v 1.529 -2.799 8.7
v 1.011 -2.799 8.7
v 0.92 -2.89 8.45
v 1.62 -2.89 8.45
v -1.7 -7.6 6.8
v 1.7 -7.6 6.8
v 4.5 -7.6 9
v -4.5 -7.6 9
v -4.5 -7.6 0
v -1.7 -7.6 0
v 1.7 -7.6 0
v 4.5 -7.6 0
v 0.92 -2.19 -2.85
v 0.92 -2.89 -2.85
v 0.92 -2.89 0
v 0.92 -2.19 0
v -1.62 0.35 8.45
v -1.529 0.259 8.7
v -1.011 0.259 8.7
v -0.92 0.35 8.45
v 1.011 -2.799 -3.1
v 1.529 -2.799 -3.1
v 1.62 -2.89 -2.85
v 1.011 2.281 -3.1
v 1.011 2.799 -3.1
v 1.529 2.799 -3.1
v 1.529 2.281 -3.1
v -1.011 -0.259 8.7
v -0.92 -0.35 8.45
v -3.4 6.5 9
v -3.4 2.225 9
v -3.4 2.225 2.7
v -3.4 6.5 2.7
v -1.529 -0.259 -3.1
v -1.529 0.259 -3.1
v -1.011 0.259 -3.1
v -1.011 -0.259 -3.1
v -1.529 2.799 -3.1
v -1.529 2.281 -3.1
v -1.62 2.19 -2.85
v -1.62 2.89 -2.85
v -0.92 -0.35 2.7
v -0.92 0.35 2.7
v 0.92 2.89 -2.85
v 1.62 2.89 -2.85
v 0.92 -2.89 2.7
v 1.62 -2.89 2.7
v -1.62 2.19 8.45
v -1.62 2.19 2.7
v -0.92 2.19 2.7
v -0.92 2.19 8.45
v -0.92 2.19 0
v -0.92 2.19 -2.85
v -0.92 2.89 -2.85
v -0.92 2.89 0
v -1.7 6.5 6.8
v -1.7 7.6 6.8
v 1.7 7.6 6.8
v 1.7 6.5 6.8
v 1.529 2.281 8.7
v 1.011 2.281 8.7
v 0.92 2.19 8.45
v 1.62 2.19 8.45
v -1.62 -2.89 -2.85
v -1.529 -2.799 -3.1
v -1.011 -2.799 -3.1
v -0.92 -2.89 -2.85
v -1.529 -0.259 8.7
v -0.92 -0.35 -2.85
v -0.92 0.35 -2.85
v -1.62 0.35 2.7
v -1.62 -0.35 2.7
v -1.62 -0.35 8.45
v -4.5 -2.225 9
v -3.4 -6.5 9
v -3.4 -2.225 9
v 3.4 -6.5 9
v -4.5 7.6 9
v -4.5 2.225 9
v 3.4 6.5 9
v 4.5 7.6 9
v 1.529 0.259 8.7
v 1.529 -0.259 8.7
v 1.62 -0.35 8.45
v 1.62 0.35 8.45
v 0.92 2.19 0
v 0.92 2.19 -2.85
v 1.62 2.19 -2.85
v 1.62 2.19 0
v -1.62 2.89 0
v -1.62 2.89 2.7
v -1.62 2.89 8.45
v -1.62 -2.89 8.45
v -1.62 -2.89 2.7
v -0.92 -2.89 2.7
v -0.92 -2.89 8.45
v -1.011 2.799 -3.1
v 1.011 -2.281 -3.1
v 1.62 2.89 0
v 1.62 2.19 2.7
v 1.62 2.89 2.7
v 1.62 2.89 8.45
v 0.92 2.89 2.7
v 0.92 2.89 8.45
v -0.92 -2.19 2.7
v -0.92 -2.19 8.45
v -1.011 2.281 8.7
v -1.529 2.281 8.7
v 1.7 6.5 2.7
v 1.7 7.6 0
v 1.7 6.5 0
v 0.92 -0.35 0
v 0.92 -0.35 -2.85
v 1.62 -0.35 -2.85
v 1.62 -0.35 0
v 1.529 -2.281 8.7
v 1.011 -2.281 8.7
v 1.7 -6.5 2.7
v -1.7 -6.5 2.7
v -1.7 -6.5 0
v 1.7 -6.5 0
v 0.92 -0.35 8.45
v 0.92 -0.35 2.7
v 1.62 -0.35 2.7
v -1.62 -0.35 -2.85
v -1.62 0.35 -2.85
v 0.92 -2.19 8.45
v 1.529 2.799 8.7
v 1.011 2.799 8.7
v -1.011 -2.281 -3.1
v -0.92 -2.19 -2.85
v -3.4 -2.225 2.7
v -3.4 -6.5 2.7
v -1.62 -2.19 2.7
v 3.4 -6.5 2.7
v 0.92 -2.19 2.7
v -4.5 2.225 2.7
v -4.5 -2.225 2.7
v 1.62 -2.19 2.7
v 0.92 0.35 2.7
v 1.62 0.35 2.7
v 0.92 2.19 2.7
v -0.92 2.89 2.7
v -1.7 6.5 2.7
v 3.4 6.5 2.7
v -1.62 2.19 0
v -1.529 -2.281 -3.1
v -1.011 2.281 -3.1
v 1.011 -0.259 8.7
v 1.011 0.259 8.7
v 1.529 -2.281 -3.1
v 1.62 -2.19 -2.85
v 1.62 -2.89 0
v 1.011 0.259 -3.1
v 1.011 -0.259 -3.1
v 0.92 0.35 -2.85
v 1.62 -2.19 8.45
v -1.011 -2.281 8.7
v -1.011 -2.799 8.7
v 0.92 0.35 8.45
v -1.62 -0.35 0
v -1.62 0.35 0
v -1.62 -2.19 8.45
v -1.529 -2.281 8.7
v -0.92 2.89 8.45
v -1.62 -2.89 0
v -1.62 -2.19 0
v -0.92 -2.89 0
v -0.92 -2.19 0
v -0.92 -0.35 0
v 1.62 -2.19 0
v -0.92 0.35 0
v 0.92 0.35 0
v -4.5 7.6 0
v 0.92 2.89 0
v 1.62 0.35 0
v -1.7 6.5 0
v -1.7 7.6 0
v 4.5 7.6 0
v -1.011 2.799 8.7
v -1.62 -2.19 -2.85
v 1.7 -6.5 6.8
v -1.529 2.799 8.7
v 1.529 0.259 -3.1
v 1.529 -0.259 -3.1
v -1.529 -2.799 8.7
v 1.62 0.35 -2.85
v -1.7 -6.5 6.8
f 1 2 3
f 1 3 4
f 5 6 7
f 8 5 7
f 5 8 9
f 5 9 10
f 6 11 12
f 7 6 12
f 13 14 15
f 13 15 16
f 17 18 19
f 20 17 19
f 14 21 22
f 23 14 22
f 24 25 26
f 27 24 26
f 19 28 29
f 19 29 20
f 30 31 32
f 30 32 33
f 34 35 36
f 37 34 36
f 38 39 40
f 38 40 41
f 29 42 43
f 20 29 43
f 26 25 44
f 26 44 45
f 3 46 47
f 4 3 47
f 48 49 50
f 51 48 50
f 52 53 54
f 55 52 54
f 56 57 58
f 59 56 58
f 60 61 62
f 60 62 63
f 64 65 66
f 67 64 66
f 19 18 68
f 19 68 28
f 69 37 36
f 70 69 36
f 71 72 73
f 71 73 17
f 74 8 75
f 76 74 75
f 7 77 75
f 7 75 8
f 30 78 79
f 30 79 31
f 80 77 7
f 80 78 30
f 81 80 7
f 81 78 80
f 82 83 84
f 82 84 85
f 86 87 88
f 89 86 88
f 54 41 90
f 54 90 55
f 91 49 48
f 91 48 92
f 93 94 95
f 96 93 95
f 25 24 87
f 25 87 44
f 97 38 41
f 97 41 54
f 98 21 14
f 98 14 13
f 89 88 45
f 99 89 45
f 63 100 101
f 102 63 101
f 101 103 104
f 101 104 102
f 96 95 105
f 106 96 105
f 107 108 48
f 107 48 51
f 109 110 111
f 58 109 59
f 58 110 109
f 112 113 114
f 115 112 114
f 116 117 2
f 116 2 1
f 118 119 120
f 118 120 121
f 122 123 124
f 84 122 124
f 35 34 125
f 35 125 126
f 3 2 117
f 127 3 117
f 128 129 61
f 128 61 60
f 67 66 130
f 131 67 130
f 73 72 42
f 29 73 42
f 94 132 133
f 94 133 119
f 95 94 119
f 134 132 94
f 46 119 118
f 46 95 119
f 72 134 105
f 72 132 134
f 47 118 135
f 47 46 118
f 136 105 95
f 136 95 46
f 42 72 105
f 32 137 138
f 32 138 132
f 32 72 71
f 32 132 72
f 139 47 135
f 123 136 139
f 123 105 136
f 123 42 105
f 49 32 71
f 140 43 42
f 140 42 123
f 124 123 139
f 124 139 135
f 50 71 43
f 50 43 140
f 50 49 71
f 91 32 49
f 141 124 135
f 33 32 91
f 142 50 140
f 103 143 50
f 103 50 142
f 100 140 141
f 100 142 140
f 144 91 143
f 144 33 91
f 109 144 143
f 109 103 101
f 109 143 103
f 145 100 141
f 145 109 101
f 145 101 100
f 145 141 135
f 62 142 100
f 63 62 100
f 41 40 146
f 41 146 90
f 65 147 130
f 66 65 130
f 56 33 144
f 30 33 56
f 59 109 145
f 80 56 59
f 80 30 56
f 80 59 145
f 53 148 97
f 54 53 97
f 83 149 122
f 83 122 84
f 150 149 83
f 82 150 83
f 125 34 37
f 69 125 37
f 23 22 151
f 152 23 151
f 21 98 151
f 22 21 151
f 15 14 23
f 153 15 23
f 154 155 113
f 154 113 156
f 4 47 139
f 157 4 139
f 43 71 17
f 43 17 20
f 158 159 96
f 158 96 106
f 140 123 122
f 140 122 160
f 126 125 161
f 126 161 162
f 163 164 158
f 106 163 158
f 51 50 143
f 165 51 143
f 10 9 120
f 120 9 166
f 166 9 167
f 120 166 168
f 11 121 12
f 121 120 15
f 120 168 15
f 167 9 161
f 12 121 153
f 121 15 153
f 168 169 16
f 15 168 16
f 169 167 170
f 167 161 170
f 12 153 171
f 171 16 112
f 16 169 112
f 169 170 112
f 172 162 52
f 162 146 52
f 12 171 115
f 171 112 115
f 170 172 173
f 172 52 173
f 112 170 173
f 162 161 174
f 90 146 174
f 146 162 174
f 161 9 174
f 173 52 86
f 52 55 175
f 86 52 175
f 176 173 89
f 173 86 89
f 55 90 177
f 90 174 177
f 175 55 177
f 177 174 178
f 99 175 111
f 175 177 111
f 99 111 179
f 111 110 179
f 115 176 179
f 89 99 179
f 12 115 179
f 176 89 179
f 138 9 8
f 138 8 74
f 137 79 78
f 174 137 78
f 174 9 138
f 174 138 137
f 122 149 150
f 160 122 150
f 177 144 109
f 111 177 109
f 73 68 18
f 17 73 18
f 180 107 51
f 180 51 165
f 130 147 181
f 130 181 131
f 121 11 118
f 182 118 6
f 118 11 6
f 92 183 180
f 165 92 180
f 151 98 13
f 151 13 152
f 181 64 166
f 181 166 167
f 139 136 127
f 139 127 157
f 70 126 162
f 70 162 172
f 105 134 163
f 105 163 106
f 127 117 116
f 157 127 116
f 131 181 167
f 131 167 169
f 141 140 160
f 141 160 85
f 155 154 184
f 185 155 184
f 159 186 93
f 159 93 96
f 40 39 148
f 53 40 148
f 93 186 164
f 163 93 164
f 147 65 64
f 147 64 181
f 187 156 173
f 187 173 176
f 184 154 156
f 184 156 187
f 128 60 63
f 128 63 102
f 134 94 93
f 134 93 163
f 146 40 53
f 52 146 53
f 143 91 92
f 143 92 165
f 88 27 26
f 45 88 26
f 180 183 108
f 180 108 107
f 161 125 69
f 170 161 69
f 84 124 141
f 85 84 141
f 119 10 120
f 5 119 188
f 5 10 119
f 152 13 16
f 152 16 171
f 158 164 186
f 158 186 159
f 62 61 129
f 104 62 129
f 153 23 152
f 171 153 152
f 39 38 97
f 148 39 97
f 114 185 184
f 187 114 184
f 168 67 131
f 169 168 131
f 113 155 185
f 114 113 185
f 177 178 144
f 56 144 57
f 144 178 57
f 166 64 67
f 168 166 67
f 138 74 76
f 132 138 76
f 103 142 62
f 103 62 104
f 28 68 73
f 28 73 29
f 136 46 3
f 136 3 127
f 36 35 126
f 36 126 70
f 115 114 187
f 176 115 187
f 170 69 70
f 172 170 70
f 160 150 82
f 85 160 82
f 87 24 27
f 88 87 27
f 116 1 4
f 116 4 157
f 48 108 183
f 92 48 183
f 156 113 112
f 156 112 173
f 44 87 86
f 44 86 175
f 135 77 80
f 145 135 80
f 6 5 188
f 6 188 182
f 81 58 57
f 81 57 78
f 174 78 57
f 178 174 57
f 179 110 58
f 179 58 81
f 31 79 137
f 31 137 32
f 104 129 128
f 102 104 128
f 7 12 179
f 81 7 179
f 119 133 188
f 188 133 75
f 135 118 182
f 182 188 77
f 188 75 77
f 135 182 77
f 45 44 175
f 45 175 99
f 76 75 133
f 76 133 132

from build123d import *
from OCP.BRepFilletAPI import BRepFilletAPI_MakeChamfer

# Parameters (mm, degrees)
SKETCH1_W            = 9
SKETCH1_H            = 15.2
BOSS_EXTRUDE1_DEPTH  = 9
SKETCH2_W            = 6.8
SKETCH2_H            = 13
CUT_EXTRUDE1_DEPTH   = 6.3
SKETCH3_W            = 1.1
SKETCH3_H            = 4.45
CUT_EXTRUDE2_DEPTH   = 6.3
SKETCH4_W            = 3.4
SKETCH4_H            = 6.8
CUT_EXTRUDE3_DEPTH   = 1.1
BOSS_EXTRUDE2_START  = -5.8
SKETCH5_W            = 0.7
SKETCH5_H            = 0.7
BOSS_EXTRUDE2_DEPTH  = 11.8
LPATTERN1_COUNT      = 2
LPATTERN1_PITCH      = 2.54
LPATTERN1_COUNT_DIR2 = 3
LPATTERN1_PITCH_DIR2 = 2.54
CHAMFER1_SIZE        = 0.25
CHAMFER1_SIZE2       = 0.090992559


with BuildPart() as part:
    # Sketch1 → Boss-Extrude1 (new body)
    with BuildSketch(Plane.XY):
        Rectangle(SKETCH1_W, SKETCH1_H)
    extrude(amount=BOSS_EXTRUDE1_DEPTH)

    # Sketch2 → Cut-Extrude1 (cut)
    with BuildSketch(Plane.XY.offset(9)):
        Rectangle(SKETCH2_W, SKETCH2_H)
    extrude(amount=-CUT_EXTRUDE1_DEPTH, mode=Mode.SUBTRACT)

    # Sketch3 → Cut-Extrude2 (cut)
    with BuildSketch(Plane.XY.offset(9)):
        with Locations((-3.95, 0)):
            Rectangle(SKETCH3_W, SKETCH3_H)
    extrude(amount=-CUT_EXTRUDE2_DEPTH, mode=Mode.SUBTRACT)

    # Sketch4 → Cut-Extrude3 (cut)
    with BuildSketch(Plane.XZ.offset(7.6)):
        with Locations((0, 3.4)):
            Rectangle(SKETCH4_W, SKETCH4_H)
    cut_extrude3 = extrude(amount=-CUT_EXTRUDE3_DEPTH, mode=Mode.SUBTRACT)

    # Mirror1: Cut-Extrude3 across plane
    add(cut_extrude3.mirror(Plane.ZX), mode=Mode.SUBTRACT)

    # Sketch5 → Boss-Extrude2 (add)
    with BuildSketch(Plane.XY.offset(2.7).offset(BOSS_EXTRUDE2_START)):
        with Locations((-1.27, 2.54)):
            Rectangle(SKETCH5_W, SKETCH5_H)
    boss_extrude2 = extrude(amount=BOSS_EXTRUDE2_DEPTH)

    # LPattern1: Boss-Extrude2 2 × 3
    with Locations(*[(i * LPATTERN1_PITCH, -j * LPATTERN1_PITCH_DIR2, 0) for i in range(LPATTERN1_COUNT) for j in range(LPATTERN1_COUNT_DIR2) if (i, j) != (0, 0)]):
        add(boss_extrude2)

    # Chamfer1: one chamfer whose edges measure the first distance from different faces: ONE call of the kernel's chamfer builder (chamfer() names one face for all edges)
    chamfer1_edges_1 = [part.edges().sort_by_distance(p)[0] for p in [
        (-0.92, 0, -3.1),
    ]]
    chamfer1_side_1 = [part.faces().sort_by_distance(p)[0] for p in [
        (-0.92, 0, -1.55),
    ]]
    chamfer1_edges_2 = [part.edges().sort_by_distance(p)[0] for p in [
        (-1.27, -0.35, -3.1),
    ]]
    chamfer1_side_2 = [part.faces().sort_by_distance(p)[0] for p in [
        (-1.27, -0.35, -1.55),
    ]]
    chamfer1_edges_3 = [part.edges().sort_by_distance(p)[0] for p in [
        (-1.62, 0, -3.1),
    ]]
    chamfer1_side_3 = [part.faces().sort_by_distance(p)[0] for p in [
        (-1.62, 0, -1.55),
    ]]
    chamfer1_edges_4 = [part.edges().sort_by_distance(p)[0] for p in [
        (-1.27, 0.35, -3.1),
    ]]
    chamfer1_side_4 = [part.faces().sort_by_distance(p)[0] for p in [
        (-1.27, 0.35, -1.55),
    ]]
    chamfer1_edges_5 = [part.edges().sort_by_distance(p)[0] for p in [
        (-0.92, 0, 8.7),
    ]]
    chamfer1_side_5 = [part.faces().sort_by_distance(p)[0] for p in [
        (-0.92, 0, 5.7),
    ]]
    chamfer1_edges_6 = [part.edges().sort_by_distance(p)[0] for p in [
        (-1.27, 0.35, 8.7),
    ]]
    chamfer1_side_6 = [part.faces().sort_by_distance(p)[0] for p in [
        (-1.27, 0.35, 5.7),
    ]]
    chamfer1_edges_7 = [part.edges().sort_by_distance(p)[0] for p in [
        (-1.62, 0, 8.7),
    ]]
    chamfer1_side_7 = [part.faces().sort_by_distance(p)[0] for p in [
        (-1.62, 0, 5.7),
    ]]
    chamfer1_edges_8 = [part.edges().sort_by_distance(p)[0] for p in [
        (-1.27, -0.35, 8.7),
    ]]
    chamfer1_side_8 = [part.faces().sort_by_distance(p)[0] for p in [
        (-1.27, -0.35, 5.7),
    ]]
    chamfer1_edges_9 = [part.edges().sort_by_distance(p)[0] for p in [
        (-0.92, -2.54, -3.1),
    ]]
    chamfer1_side_9 = [part.faces().sort_by_distance(p)[0] for p in [
        (-0.92, -2.54, -1.55),
    ]]
    chamfer1_edges_10 = [part.edges().sort_by_distance(p)[0] for p in [
        (-1.27, -2.89, -3.1),
    ]]
    chamfer1_side_10 = [part.faces().sort_by_distance(p)[0] for p in [
        (-1.27, -2.89, -1.55),
    ]]
    chamfer1_edges_11 = [part.edges().sort_by_distance(p)[0] for p in [
        (-1.62, -2.54, -3.1),
    ]]
    chamfer1_side_11 = [part.faces().sort_by_distance(p)[0] for p in [
        (-1.62, -2.54, -1.55),
    ]]
    chamfer1_edges_12 = [part.edges().sort_by_distance(p)[0] for p in [
        (-1.27, -2.19, -3.1),
    ]]
    chamfer1_side_12 = [part.faces().sort_by_distance(p)[0] for p in [
        (-1.27, -2.19, -1.55),
    ]]
    chamfer1_edges_13 = [part.edges().sort_by_distance(p)[0] for p in [
        (-0.92, -2.54, 8.7),
    ]]
    chamfer1_side_13 = [part.faces().sort_by_distance(p)[0] for p in [
        (-0.92, -2.54, 5.7),
    ]]
    chamfer1_edges_14 = [part.edges().sort_by_distance(p)[0] for p in [
        (-1.27, -2.19, 8.7),
    ]]
    chamfer1_side_14 = [part.faces().sort_by_distance(p)[0] for p in [
        (-1.27, -2.19, 5.7),
    ]]
    chamfer1_edges_15 = [part.edges().sort_by_distance(p)[0] for p in [
        (-1.62, -2.54, 8.7),
    ]]
    chamfer1_side_15 = [part.faces().sort_by_distance(p)[0] for p in [
        (-1.62, -2.54, 5.7),
    ]]
    chamfer1_edges_16 = [part.edges().sort_by_distance(p)[0] for p in [
        (-1.27, -2.89, 8.7),
    ]]
    chamfer1_side_16 = [part.faces().sort_by_distance(p)[0] for p in [
        (-1.27, -2.89, 5.7),
    ]]
    chamfer1_edges_17 = [part.edges().sort_by_distance(p)[0] for p in [
        (1.62, 2.54, -3.1),
    ]]
    chamfer1_side_17 = [part.faces().sort_by_distance(p)[0] for p in [
        (1.62, 2.54, -1.55),
    ]]
    chamfer1_edges_18 = [part.edges().sort_by_distance(p)[0] for p in [
        (1.27, 2.19, -3.1),
    ]]
    chamfer1_side_18 = [part.faces().sort_by_distance(p)[0] for p in [
        (1.27, 2.19, -1.55),
    ]]
    chamfer1_edges_19 = [part.edges().sort_by_distance(p)[0] for p in [
        (0.92, 2.54, -3.1),
    ]]
    chamfer1_side_19 = [part.faces().sort_by_distance(p)[0] for p in [
        (0.92, 2.54, -1.55),
    ]]
    chamfer1_edges_20 = [part.edges().sort_by_distance(p)[0] for p in [
        (1.27, 2.89, -3.1),
    ]]
    chamfer1_side_20 = [part.faces().sort_by_distance(p)[0] for p in [
        (1.27, 2.89, -1.55),
    ]]
    chamfer1_edges_21 = [part.edges().sort_by_distance(p)[0] for p in [
        (1.62, 2.54, 8.7),
    ]]
    chamfer1_side_21 = [part.faces().sort_by_distance(p)[0] for p in [
        (1.62, 2.54, 5.7),
    ]]
    chamfer1_edges_22 = [part.edges().sort_by_distance(p)[0] for p in [
        (1.27, 2.89, 8.7),
    ]]
    chamfer1_side_22 = [part.faces().sort_by_distance(p)[0] for p in [
        (1.27, 2.89, 5.7),
    ]]
    chamfer1_edges_23 = [part.edges().sort_by_distance(p)[0] for p in [
        (0.92, 2.54, 8.7),
    ]]
    chamfer1_side_23 = [part.faces().sort_by_distance(p)[0] for p in [
        (0.92, 2.54, 5.7),
    ]]
    chamfer1_edges_24 = [part.edges().sort_by_distance(p)[0] for p in [
        (1.27, 2.19, 8.7),
    ]]
    chamfer1_side_24 = [part.faces().sort_by_distance(p)[0] for p in [
        (1.27, 2.19, 5.7),
    ]]
    chamfer1_edges_25 = [part.edges().sort_by_distance(p)[0] for p in [
        (1.62, 0, -3.1),
    ]]
    chamfer1_side_25 = [part.faces().sort_by_distance(p)[0] for p in [
        (1.62, 0, -1.55),
    ]]
    chamfer1_edges_26 = [part.edges().sort_by_distance(p)[0] for p in [
        (1.27, -0.35, -3.1),
    ]]
    chamfer1_side_26 = [part.faces().sort_by_distance(p)[0] for p in [
        (1.27, -0.35, -1.55),
    ]]
    chamfer1_edges_27 = [part.edges().sort_by_distance(p)[0] for p in [
        (0.92, 0, -3.1),
    ]]
    chamfer1_side_27 = [part.faces().sort_by_distance(p)[0] for p in [
        (0.92, 0, -1.55),
    ]]
    chamfer1_edges_28 = [part.edges().sort_by_distance(p)[0] for p in [
        (1.27, 0.35, -3.1),
    ]]
    chamfer1_side_28 = [part.faces().sort_by_distance(p)[0] for p in [
        (1.27, 0.35, -1.55),
    ]]
    chamfer1_edges_29 = [part.edges().sort_by_distance(p)[0] for p in [
        (1.62, 0, 8.7),
    ]]
    chamfer1_side_29 = [part.faces().sort_by_distance(p)[0] for p in [
        (1.62, 0, 5.7),
    ]]
    chamfer1_edges_30 = [part.edges().sort_by_distance(p)[0] for p in [
        (1.27, 0.35, 8.7),
    ]]
    chamfer1_side_30 = [part.faces().sort_by_distance(p)[0] for p in [
        (1.27, 0.35, 5.7),
    ]]
    chamfer1_edges_31 = [part.edges().sort_by_distance(p)[0] for p in [
        (0.92, 0, 8.7),
    ]]
    chamfer1_side_31 = [part.faces().sort_by_distance(p)[0] for p in [
        (0.92, 0, 5.7),
    ]]
    chamfer1_edges_32 = [part.edges().sort_by_distance(p)[0] for p in [
        (1.27, -0.35, 8.7),
    ]]
    chamfer1_side_32 = [part.faces().sort_by_distance(p)[0] for p in [
        (1.27, -0.35, 5.7),
    ]]
    chamfer1_edges_33 = [part.edges().sort_by_distance(p)[0] for p in [
        (1.62, -2.54, -3.1),
    ]]
    chamfer1_side_33 = [part.faces().sort_by_distance(p)[0] for p in [
        (1.62, -2.54, -1.55),
    ]]
    chamfer1_edges_34 = [part.edges().sort_by_distance(p)[0] for p in [
        (1.27, -2.89, -3.1),
    ]]
    chamfer1_side_34 = [part.faces().sort_by_distance(p)[0] for p in [
        (1.27, -2.89, -1.55),
    ]]
    chamfer1_edges_35 = [part.edges().sort_by_distance(p)[0] for p in [
        (0.92, -2.54, -3.1),
    ]]
    chamfer1_side_35 = [part.faces().sort_by_distance(p)[0] for p in [
        (0.92, -2.54, -1.55),
    ]]
    chamfer1_edges_36 = [part.edges().sort_by_distance(p)[0] for p in [
        (1.27, -2.19, -3.1),
    ]]
    chamfer1_side_36 = [part.faces().sort_by_distance(p)[0] for p in [
        (1.27, -2.19, -1.55),
    ]]
    chamfer1_edges_37 = [part.edges().sort_by_distance(p)[0] for p in [
        (1.62, -2.54, 8.7),
    ]]
    chamfer1_side_37 = [part.faces().sort_by_distance(p)[0] for p in [
        (1.62, -2.54, 5.7),
    ]]
    chamfer1_edges_38 = [part.edges().sort_by_distance(p)[0] for p in [
        (1.27, -2.19, 8.7),
    ]]
    chamfer1_side_38 = [part.faces().sort_by_distance(p)[0] for p in [
        (1.27, -2.19, 5.7),
    ]]
    chamfer1_edges_39 = [part.edges().sort_by_distance(p)[0] for p in [
        (0.92, -2.54, 8.7),
    ]]
    chamfer1_side_39 = [part.faces().sort_by_distance(p)[0] for p in [
        (0.92, -2.54, 5.7),
    ]]
    chamfer1_edges_40 = [part.edges().sort_by_distance(p)[0] for p in [
        (1.27, -2.89, 8.7),
    ]]
    chamfer1_side_40 = [part.faces().sort_by_distance(p)[0] for p in [
        (1.27, -2.89, 5.7),
    ]]
    chamfer1_edges_41 = [part.edges().sort_by_distance(p)[0] for p in [
        (-0.92, 2.54, -3.1),
    ]]
    chamfer1_side_41 = [part.faces().sort_by_distance(p)[0] for p in [
        (-0.92, 2.54, -1.55),
    ]]
    chamfer1_edges_42 = [part.edges().sort_by_distance(p)[0] for p in [
        (-1.27, 2.19, -3.1),
    ]]
    chamfer1_side_42 = [part.faces().sort_by_distance(p)[0] for p in [
        (-1.27, 2.19, -1.55),
    ]]
    chamfer1_edges_43 = [part.edges().sort_by_distance(p)[0] for p in [
        (-1.62, 2.54, -3.1),
    ]]
    chamfer1_side_43 = [part.faces().sort_by_distance(p)[0] for p in [
        (-1.62, 2.54, -1.55),
    ]]
    chamfer1_edges_44 = [part.edges().sort_by_distance(p)[0] for p in [
        (-1.27, 2.89, -3.1),
    ]]
    chamfer1_side_44 = [part.faces().sort_by_distance(p)[0] for p in [
        (-1.27, 2.89, -1.55),
    ]]
    chamfer1_edges_45 = [part.edges().sort_by_distance(p)[0] for p in [
        (-0.92, 2.54, 8.7),
    ]]
    chamfer1_side_45 = [part.faces().sort_by_distance(p)[0] for p in [
        (-0.92, 2.54, 5.7),
    ]]
    chamfer1_edges_46 = [part.edges().sort_by_distance(p)[0] for p in [
        (-1.27, 2.89, 8.7),
    ]]
    chamfer1_side_46 = [part.faces().sort_by_distance(p)[0] for p in [
        (-1.27, 2.89, 5.7),
    ]]
    chamfer1_edges_47 = [part.edges().sort_by_distance(p)[0] for p in [
        (-1.62, 2.54, 8.7),
    ]]
    chamfer1_side_47 = [part.faces().sort_by_distance(p)[0] for p in [
        (-1.62, 2.54, 5.7),
    ]]
    chamfer1_edges_48 = [part.edges().sort_by_distance(p)[0] for p in [
        (-1.27, 2.19, 8.7),
    ]]
    chamfer1_side_48 = [part.faces().sort_by_distance(p)[0] for p in [
        (-1.27, 2.19, 5.7),
    ]]
    chamfer1 = BRepFilletAPI_MakeChamfer(part.part.solid().wrapped)
    for e in chamfer1_edges_1:
        chamfer1.Add(CHAMFER1_SIZE, CHAMFER1_SIZE2, e.wrapped, chamfer1_side_1[0].wrapped)  # the first distance lies on this face
    for e in chamfer1_edges_2:
        chamfer1.Add(CHAMFER1_SIZE, CHAMFER1_SIZE2, e.wrapped, chamfer1_side_2[0].wrapped)  # the first distance lies on this face
    for e in chamfer1_edges_3:
        chamfer1.Add(CHAMFER1_SIZE, CHAMFER1_SIZE2, e.wrapped, chamfer1_side_3[0].wrapped)  # the first distance lies on this face
    for e in chamfer1_edges_4:
        chamfer1.Add(CHAMFER1_SIZE, CHAMFER1_SIZE2, e.wrapped, chamfer1_side_4[0].wrapped)  # the first distance lies on this face
    for e in chamfer1_edges_5:
        chamfer1.Add(CHAMFER1_SIZE, CHAMFER1_SIZE2, e.wrapped, chamfer1_side_5[0].wrapped)  # the first distance lies on this face
    for e in chamfer1_edges_6:
        chamfer1.Add(CHAMFER1_SIZE, CHAMFER1_SIZE2, e.wrapped, chamfer1_side_6[0].wrapped)  # the first distance lies on this face
    for e in chamfer1_edges_7:
        chamfer1.Add(CHAMFER1_SIZE, CHAMFER1_SIZE2, e.wrapped, chamfer1_side_7[0].wrapped)  # the first distance lies on this face
    for e in chamfer1_edges_8:
        chamfer1.Add(CHAMFER1_SIZE, CHAMFER1_SIZE2, e.wrapped, chamfer1_side_8[0].wrapped)  # the first distance lies on this face
    for e in chamfer1_edges_9:
        chamfer1.Add(CHAMFER1_SIZE, CHAMFER1_SIZE2, e.wrapped, chamfer1_side_9[0].wrapped)  # the first distance lies on this face
    for e in chamfer1_edges_10:
        chamfer1.Add(CHAMFER1_SIZE, CHAMFER1_SIZE2, e.wrapped, chamfer1_side_10[0].wrapped)  # the first distance lies on this face
    for e in chamfer1_edges_11:
        chamfer1.Add(CHAMFER1_SIZE, CHAMFER1_SIZE2, e.wrapped, chamfer1_side_11[0].wrapped)  # the first distance lies on this face
    for e in chamfer1_edges_12:
        chamfer1.Add(CHAMFER1_SIZE, CHAMFER1_SIZE2, e.wrapped, chamfer1_side_12[0].wrapped)  # the first distance lies on this face
    for e in chamfer1_edges_13:
        chamfer1.Add(CHAMFER1_SIZE, CHAMFER1_SIZE2, e.wrapped, chamfer1_side_13[0].wrapped)  # the first distance lies on this face
    for e in chamfer1_edges_14:
        chamfer1.Add(CHAMFER1_SIZE, CHAMFER1_SIZE2, e.wrapped, chamfer1_side_14[0].wrapped)  # the first distance lies on this face
    for e in chamfer1_edges_15:
        chamfer1.Add(CHAMFER1_SIZE, CHAMFER1_SIZE2, e.wrapped, chamfer1_side_15[0].wrapped)  # the first distance lies on this face
    for e in chamfer1_edges_16:
        chamfer1.Add(CHAMFER1_SIZE, CHAMFER1_SIZE2, e.wrapped, chamfer1_side_16[0].wrapped)  # the first distance lies on this face
    for e in chamfer1_edges_17:
        chamfer1.Add(CHAMFER1_SIZE, CHAMFER1_SIZE2, e.wrapped, chamfer1_side_17[0].wrapped)  # the first distance lies on this face
    for e in chamfer1_edges_18:
        chamfer1.Add(CHAMFER1_SIZE, CHAMFER1_SIZE2, e.wrapped, chamfer1_side_18[0].wrapped)  # the first distance lies on this face
    for e in chamfer1_edges_19:
        chamfer1.Add(CHAMFER1_SIZE, CHAMFER1_SIZE2, e.wrapped, chamfer1_side_19[0].wrapped)  # the first distance lies on this face
    for e in chamfer1_edges_20:
        chamfer1.Add(CHAMFER1_SIZE, CHAMFER1_SIZE2, e.wrapped, chamfer1_side_20[0].wrapped)  # the first distance lies on this face
    for e in chamfer1_edges_21:
        chamfer1.Add(CHAMFER1_SIZE, CHAMFER1_SIZE2, e.wrapped, chamfer1_side_21[0].wrapped)  # the first distance lies on this face
    for e in chamfer1_edges_22:
        chamfer1.Add(CHAMFER1_SIZE, CHAMFER1_SIZE2, e.wrapped, chamfer1_side_22[0].wrapped)  # the first distance lies on this face
    for e in chamfer1_edges_23:
        chamfer1.Add(CHAMFER1_SIZE, CHAMFER1_SIZE2, e.wrapped, chamfer1_side_23[0].wrapped)  # the first distance lies on this face
    for e in chamfer1_edges_24:
        chamfer1.Add(CHAMFER1_SIZE, CHAMFER1_SIZE2, e.wrapped, chamfer1_side_24[0].wrapped)  # the first distance lies on this face
    for e in chamfer1_edges_25:
        chamfer1.Add(CHAMFER1_SIZE, CHAMFER1_SIZE2, e.wrapped, chamfer1_side_25[0].wrapped)  # the first distance lies on this face
    for e in chamfer1_edges_26:
        chamfer1.Add(CHAMFER1_SIZE, CHAMFER1_SIZE2, e.wrapped, chamfer1_side_26[0].wrapped)  # the first distance lies on this face
    for e in chamfer1_edges_27:
        chamfer1.Add(CHAMFER1_SIZE, CHAMFER1_SIZE2, e.wrapped, chamfer1_side_27[0].wrapped)  # the first distance lies on this face
    for e in chamfer1_edges_28:
        chamfer1.Add(CHAMFER1_SIZE, CHAMFER1_SIZE2, e.wrapped, chamfer1_side_28[0].wrapped)  # the first distance lies on this face
    for e in chamfer1_edges_29:
        chamfer1.Add(CHAMFER1_SIZE, CHAMFER1_SIZE2, e.wrapped, chamfer1_side_29[0].wrapped)  # the first distance lies on this face
    for e in chamfer1_edges_30:
        chamfer1.Add(CHAMFER1_SIZE, CHAMFER1_SIZE2, e.wrapped, chamfer1_side_30[0].wrapped)  # the first distance lies on this face
    for e in chamfer1_edges_31:
        chamfer1.Add(CHAMFER1_SIZE, CHAMFER1_SIZE2, e.wrapped, chamfer1_side_31[0].wrapped)  # the first distance lies on this face
    for e in chamfer1_edges_32:
        chamfer1.Add(CHAMFER1_SIZE, CHAMFER1_SIZE2, e.wrapped, chamfer1_side_32[0].wrapped)  # the first distance lies on this face
    for e in chamfer1_edges_33:
        chamfer1.Add(CHAMFER1_SIZE, CHAMFER1_SIZE2, e.wrapped, chamfer1_side_33[0].wrapped)  # the first distance lies on this face
    for e in chamfer1_edges_34:
        chamfer1.Add(CHAMFER1_SIZE, CHAMFER1_SIZE2, e.wrapped, chamfer1_side_34[0].wrapped)  # the first distance lies on this face
    for e in chamfer1_edges_35:
        chamfer1.Add(CHAMFER1_SIZE, CHAMFER1_SIZE2, e.wrapped, chamfer1_side_35[0].wrapped)  # the first distance lies on this face
    for e in chamfer1_edges_36:
        chamfer1.Add(CHAMFER1_SIZE, CHAMFER1_SIZE2, e.wrapped, chamfer1_side_36[0].wrapped)  # the first distance lies on this face
    for e in chamfer1_edges_37:
        chamfer1.Add(CHAMFER1_SIZE, CHAMFER1_SIZE2, e.wrapped, chamfer1_side_37[0].wrapped)  # the first distance lies on this face
    for e in chamfer1_edges_38:
        chamfer1.Add(CHAMFER1_SIZE, CHAMFER1_SIZE2, e.wrapped, chamfer1_side_38[0].wrapped)  # the first distance lies on this face
    for e in chamfer1_edges_39:
        chamfer1.Add(CHAMFER1_SIZE, CHAMFER1_SIZE2, e.wrapped, chamfer1_side_39[0].wrapped)  # the first distance lies on this face
    for e in chamfer1_edges_40:
        chamfer1.Add(CHAMFER1_SIZE, CHAMFER1_SIZE2, e.wrapped, chamfer1_side_40[0].wrapped)  # the first distance lies on this face
    for e in chamfer1_edges_41:
        chamfer1.Add(CHAMFER1_SIZE, CHAMFER1_SIZE2, e.wrapped, chamfer1_side_41[0].wrapped)  # the first distance lies on this face
    for e in chamfer1_edges_42:
        chamfer1.Add(CHAMFER1_SIZE, CHAMFER1_SIZE2, e.wrapped, chamfer1_side_42[0].wrapped)  # the first distance lies on this face
    for e in chamfer1_edges_43:
        chamfer1.Add(CHAMFER1_SIZE, CHAMFER1_SIZE2, e.wrapped, chamfer1_side_43[0].wrapped)  # the first distance lies on this face
    for e in chamfer1_edges_44:
        chamfer1.Add(CHAMFER1_SIZE, CHAMFER1_SIZE2, e.wrapped, chamfer1_side_44[0].wrapped)  # the first distance lies on this face
    for e in chamfer1_edges_45:
        chamfer1.Add(CHAMFER1_SIZE, CHAMFER1_SIZE2, e.wrapped, chamfer1_side_45[0].wrapped)  # the first distance lies on this face
    for e in chamfer1_edges_46:
        chamfer1.Add(CHAMFER1_SIZE, CHAMFER1_SIZE2, e.wrapped, chamfer1_side_46[0].wrapped)  # the first distance lies on this face
    for e in chamfer1_edges_47:
        chamfer1.Add(CHAMFER1_SIZE, CHAMFER1_SIZE2, e.wrapped, chamfer1_side_47[0].wrapped)  # the first distance lies on this face
    for e in chamfer1_edges_48:
        chamfer1.Add(CHAMFER1_SIZE, CHAMFER1_SIZE2, e.wrapped, chamfer1_side_48[0].wrapped)  # the first distance lies on this face
    add(Compound.cast(chamfer1.Shape()), mode=Mode.REPLACE)


solid = part.part
